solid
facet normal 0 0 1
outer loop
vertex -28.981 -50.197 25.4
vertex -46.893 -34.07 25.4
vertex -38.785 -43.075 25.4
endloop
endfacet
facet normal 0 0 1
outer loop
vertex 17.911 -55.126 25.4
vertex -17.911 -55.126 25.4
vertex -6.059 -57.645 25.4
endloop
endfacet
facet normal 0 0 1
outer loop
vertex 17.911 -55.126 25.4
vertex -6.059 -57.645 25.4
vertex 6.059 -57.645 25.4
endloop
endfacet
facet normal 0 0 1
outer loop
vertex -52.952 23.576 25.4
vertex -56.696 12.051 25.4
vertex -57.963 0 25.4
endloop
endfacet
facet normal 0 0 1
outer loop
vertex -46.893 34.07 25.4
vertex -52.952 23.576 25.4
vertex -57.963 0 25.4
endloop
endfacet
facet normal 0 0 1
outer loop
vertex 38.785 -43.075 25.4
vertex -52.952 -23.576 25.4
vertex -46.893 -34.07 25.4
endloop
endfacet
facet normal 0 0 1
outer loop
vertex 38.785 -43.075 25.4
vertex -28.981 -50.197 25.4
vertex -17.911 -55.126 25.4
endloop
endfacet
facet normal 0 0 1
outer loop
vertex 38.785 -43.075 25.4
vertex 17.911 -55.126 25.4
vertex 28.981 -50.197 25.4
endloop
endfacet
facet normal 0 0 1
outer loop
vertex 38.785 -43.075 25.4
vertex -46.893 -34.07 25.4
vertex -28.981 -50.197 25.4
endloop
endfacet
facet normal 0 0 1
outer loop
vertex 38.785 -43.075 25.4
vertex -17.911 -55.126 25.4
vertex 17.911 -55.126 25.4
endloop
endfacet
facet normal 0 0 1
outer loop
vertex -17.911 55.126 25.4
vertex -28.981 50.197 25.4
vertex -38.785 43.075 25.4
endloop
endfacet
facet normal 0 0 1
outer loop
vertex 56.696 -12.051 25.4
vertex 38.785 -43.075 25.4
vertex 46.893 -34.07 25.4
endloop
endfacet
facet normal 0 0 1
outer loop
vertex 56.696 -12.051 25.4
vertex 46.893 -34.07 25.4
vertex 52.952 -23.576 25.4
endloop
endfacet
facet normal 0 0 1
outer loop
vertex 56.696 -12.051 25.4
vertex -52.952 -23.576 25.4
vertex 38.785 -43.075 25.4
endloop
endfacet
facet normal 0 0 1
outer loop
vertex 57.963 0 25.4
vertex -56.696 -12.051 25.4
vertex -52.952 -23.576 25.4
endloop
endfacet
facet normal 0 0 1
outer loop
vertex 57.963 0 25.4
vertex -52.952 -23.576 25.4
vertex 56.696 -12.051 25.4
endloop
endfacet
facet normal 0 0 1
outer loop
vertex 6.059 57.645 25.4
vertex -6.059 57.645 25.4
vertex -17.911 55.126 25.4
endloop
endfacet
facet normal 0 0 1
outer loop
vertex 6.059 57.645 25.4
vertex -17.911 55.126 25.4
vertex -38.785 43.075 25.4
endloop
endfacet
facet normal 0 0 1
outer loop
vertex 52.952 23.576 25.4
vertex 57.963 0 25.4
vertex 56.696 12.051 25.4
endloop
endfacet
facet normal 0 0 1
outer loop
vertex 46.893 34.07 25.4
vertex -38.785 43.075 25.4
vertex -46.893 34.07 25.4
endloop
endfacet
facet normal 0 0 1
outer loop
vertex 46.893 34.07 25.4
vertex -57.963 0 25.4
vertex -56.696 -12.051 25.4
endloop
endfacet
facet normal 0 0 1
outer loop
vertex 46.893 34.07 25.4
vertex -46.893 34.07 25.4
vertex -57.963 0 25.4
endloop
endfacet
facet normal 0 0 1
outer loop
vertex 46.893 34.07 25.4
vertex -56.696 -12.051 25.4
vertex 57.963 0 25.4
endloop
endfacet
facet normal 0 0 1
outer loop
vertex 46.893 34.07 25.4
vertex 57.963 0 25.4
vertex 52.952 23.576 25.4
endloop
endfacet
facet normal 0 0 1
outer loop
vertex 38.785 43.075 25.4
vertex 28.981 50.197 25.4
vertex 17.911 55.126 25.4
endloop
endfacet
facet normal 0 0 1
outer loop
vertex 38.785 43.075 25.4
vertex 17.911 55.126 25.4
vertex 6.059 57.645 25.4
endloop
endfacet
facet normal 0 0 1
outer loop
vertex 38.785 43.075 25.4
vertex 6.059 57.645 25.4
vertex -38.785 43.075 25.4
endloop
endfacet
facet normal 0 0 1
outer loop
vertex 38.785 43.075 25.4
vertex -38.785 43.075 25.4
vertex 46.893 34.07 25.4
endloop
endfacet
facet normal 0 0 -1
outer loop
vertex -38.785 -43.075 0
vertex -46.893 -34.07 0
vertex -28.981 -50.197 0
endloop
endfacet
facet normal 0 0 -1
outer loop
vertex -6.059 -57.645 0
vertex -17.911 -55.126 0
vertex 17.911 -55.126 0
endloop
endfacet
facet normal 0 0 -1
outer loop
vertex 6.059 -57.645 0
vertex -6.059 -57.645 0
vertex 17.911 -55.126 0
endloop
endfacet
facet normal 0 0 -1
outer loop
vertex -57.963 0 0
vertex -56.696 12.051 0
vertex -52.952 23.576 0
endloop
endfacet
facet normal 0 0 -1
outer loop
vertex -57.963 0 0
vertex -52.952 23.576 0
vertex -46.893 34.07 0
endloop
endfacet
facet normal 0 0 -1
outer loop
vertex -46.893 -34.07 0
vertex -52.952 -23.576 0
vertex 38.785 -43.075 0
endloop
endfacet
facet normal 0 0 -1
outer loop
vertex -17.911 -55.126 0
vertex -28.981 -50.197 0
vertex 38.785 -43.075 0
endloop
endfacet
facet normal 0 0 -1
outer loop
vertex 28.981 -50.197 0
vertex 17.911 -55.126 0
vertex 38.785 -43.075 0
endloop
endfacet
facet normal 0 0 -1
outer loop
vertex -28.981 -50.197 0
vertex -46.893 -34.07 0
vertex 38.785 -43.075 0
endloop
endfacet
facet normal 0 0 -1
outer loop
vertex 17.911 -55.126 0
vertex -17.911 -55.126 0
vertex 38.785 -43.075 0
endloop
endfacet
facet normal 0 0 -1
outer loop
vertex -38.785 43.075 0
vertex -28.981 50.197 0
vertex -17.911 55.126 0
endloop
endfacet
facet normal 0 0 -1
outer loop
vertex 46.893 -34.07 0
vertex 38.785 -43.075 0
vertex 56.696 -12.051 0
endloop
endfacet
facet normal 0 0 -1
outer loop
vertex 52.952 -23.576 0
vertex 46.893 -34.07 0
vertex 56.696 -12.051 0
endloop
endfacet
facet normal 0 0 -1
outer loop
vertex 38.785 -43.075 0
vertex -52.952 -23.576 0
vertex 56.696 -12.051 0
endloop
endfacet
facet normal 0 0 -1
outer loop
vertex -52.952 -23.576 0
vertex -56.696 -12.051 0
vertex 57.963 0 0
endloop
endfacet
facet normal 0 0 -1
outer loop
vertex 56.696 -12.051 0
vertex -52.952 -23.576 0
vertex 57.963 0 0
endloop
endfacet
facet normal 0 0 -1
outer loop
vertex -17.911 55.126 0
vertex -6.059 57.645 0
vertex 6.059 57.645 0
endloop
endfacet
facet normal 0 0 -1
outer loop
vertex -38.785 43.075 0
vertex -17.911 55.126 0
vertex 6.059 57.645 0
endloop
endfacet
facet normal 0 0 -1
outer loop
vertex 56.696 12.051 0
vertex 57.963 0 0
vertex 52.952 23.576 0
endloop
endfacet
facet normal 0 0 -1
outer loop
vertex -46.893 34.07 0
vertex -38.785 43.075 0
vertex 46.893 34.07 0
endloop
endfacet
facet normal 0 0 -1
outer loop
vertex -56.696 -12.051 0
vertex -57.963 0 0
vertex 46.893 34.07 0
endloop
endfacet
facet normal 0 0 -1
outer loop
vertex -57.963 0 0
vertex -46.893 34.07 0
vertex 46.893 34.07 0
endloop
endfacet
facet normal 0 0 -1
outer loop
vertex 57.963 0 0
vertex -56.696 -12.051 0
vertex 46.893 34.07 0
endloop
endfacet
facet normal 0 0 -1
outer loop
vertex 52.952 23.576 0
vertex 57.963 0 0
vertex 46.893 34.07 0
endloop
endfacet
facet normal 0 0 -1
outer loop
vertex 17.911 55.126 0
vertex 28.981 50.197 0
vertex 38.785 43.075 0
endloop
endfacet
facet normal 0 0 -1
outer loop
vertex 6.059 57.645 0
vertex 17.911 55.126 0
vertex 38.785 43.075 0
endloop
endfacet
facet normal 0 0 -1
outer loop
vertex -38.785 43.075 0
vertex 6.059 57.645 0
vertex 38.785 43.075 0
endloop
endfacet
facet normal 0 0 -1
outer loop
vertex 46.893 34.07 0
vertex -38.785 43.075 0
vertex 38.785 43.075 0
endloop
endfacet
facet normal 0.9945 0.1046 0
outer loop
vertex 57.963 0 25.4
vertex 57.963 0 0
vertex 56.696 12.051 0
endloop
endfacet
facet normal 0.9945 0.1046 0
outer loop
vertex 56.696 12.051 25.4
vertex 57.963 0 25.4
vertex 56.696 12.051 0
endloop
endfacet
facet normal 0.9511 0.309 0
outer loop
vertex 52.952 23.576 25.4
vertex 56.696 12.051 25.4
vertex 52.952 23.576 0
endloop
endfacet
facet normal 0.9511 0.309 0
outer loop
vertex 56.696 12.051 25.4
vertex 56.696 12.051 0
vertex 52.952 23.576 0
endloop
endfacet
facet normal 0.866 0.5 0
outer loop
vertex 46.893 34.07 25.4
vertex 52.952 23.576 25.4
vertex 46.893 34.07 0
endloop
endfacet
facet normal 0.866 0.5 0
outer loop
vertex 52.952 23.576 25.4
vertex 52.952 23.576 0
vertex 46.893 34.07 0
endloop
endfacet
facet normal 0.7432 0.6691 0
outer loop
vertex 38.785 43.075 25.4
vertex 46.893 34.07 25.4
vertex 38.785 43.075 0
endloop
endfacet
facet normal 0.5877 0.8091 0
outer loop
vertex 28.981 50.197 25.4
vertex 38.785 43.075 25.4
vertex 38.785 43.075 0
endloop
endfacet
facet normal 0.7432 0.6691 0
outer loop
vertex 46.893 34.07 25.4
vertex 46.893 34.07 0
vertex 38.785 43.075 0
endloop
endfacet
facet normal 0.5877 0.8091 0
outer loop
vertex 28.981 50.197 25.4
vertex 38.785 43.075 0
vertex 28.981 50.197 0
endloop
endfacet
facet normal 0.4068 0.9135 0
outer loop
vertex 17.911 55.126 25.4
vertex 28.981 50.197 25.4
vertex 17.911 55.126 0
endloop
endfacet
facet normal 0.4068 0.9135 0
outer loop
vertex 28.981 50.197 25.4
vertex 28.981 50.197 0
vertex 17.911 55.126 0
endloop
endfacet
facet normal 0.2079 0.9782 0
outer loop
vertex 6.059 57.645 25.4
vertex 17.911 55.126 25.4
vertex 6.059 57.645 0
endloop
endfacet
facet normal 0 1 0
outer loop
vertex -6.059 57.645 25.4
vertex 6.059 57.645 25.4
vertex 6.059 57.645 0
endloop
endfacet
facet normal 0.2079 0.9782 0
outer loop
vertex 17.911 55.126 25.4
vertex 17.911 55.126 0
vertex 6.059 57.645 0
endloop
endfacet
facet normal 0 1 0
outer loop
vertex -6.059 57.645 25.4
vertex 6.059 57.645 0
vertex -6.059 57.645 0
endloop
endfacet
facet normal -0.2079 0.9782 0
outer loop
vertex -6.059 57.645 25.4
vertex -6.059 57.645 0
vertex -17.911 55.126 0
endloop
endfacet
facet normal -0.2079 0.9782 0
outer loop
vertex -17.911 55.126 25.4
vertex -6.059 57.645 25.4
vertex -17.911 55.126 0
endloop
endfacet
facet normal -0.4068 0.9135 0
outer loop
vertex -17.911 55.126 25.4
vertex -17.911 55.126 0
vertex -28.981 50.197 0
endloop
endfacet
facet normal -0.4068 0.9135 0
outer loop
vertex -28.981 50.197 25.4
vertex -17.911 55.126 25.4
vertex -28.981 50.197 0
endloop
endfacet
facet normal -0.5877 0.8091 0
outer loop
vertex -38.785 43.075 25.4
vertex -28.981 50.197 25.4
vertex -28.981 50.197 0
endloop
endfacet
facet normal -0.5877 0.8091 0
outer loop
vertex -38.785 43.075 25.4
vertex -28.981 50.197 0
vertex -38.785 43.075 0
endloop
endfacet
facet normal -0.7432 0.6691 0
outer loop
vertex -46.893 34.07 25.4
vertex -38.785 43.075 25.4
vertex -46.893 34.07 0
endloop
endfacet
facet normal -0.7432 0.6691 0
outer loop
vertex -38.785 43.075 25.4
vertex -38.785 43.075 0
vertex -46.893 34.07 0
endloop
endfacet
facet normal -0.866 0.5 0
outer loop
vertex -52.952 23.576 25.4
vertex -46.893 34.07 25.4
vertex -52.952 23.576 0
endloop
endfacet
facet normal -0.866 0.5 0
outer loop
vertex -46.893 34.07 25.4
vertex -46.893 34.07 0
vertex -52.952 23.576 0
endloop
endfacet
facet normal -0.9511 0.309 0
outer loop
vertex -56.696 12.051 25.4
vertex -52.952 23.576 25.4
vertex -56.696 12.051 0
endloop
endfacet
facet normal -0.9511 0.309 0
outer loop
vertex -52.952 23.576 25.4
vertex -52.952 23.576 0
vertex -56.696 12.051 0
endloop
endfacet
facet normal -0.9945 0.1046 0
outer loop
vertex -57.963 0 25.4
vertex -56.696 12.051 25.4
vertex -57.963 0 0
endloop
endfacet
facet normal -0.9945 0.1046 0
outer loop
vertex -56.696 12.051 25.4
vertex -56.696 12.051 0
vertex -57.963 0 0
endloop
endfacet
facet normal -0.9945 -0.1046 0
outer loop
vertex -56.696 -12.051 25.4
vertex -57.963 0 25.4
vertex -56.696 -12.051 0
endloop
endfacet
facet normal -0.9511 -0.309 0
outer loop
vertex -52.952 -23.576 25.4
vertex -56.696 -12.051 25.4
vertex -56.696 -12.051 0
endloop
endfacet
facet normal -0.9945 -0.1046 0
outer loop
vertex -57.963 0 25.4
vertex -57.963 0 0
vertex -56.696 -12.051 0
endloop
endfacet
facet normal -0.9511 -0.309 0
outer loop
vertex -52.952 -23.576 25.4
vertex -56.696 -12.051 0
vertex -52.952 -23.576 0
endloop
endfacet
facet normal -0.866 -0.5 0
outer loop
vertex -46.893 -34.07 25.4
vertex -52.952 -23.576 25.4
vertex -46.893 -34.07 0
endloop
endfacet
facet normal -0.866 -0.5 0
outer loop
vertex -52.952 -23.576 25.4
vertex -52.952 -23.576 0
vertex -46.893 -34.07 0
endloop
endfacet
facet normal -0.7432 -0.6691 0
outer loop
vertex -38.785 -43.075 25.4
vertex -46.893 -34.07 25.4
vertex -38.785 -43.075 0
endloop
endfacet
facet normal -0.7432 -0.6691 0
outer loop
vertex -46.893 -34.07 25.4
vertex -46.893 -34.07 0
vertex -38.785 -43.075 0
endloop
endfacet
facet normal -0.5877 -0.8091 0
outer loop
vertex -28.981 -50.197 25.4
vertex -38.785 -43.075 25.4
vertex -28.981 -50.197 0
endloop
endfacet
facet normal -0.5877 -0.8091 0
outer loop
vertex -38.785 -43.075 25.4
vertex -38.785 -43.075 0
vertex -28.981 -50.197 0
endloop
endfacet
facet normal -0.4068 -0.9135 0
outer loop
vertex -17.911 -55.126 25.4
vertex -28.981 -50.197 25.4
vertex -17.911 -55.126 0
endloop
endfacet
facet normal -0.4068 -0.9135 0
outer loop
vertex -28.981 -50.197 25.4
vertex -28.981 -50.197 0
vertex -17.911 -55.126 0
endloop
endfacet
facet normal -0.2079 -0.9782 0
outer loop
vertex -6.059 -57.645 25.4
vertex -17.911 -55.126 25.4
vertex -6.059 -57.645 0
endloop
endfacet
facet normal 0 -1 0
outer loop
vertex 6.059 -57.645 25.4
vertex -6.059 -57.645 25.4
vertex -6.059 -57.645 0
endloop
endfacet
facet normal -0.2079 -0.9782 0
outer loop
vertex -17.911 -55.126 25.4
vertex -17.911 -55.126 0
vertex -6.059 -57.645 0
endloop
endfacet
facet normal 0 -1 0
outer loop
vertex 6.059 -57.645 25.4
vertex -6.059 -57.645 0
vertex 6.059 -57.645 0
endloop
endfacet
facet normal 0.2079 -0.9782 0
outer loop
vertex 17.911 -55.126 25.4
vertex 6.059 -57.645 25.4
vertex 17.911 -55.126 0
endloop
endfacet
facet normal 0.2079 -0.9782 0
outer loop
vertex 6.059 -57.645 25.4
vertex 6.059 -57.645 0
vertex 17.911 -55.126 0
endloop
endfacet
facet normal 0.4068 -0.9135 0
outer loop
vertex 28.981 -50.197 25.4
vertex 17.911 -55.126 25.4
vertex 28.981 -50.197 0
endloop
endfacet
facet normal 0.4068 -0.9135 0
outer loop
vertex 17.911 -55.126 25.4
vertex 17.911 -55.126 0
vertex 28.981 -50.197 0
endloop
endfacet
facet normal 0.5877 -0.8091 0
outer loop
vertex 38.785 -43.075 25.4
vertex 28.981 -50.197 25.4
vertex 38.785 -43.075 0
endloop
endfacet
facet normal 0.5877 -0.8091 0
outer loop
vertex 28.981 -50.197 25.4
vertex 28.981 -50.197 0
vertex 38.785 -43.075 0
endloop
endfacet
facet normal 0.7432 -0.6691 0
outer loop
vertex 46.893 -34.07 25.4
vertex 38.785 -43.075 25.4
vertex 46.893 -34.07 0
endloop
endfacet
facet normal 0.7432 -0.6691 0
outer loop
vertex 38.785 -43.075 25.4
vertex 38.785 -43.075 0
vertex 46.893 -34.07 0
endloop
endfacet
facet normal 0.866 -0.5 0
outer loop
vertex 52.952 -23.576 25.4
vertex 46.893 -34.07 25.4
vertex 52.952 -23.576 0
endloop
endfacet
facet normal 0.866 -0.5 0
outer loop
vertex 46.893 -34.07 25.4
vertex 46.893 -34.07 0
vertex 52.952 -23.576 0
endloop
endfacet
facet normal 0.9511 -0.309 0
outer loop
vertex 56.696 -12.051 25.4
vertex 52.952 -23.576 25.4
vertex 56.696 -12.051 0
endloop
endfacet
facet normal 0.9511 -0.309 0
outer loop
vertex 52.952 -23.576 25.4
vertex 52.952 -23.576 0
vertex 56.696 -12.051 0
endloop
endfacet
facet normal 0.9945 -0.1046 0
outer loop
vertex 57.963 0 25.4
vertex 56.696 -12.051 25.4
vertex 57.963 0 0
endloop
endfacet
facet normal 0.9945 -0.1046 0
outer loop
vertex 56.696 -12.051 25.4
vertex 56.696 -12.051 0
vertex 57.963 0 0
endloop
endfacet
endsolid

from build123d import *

# Parameters (mm, degrees)
F0_R      = 57.9627661604
F1_DEPTH  = 25.4
F2_R      = 32.9835616542
F1_FACE_R = 57.9627661604
F3_DEPTH  = 25.4
F4_R      = 57.9627661604
F5_DEPTH  = 25.4


with BuildPart() as f1:
    # F0 (on Top) → F1 (new body)
    with BuildSketch(Plane.XY):
        Circle(F0_R)
    extrude(amount=F1_DEPTH)

    # F2 (on Top) + F1_face (on face) → F3 (join)
    with BuildSketch(Plane.XY):
        Circle(F2_R)
    with BuildSketch(Plane(origin=(0, 0, 0), x_dir=(1, 0, 0), z_dir=(0, 0, -1))):
        Circle(F1_FACE_R)
    extrude(amount=F3_DEPTH, dir=(0, 0, 1))

    # F4 (on Top) → F5 (join)
    with BuildSketch(Plane.XY):
        Circle(F4_R)
    extrude(amount=F5_DEPTH)


solid = f1.part
